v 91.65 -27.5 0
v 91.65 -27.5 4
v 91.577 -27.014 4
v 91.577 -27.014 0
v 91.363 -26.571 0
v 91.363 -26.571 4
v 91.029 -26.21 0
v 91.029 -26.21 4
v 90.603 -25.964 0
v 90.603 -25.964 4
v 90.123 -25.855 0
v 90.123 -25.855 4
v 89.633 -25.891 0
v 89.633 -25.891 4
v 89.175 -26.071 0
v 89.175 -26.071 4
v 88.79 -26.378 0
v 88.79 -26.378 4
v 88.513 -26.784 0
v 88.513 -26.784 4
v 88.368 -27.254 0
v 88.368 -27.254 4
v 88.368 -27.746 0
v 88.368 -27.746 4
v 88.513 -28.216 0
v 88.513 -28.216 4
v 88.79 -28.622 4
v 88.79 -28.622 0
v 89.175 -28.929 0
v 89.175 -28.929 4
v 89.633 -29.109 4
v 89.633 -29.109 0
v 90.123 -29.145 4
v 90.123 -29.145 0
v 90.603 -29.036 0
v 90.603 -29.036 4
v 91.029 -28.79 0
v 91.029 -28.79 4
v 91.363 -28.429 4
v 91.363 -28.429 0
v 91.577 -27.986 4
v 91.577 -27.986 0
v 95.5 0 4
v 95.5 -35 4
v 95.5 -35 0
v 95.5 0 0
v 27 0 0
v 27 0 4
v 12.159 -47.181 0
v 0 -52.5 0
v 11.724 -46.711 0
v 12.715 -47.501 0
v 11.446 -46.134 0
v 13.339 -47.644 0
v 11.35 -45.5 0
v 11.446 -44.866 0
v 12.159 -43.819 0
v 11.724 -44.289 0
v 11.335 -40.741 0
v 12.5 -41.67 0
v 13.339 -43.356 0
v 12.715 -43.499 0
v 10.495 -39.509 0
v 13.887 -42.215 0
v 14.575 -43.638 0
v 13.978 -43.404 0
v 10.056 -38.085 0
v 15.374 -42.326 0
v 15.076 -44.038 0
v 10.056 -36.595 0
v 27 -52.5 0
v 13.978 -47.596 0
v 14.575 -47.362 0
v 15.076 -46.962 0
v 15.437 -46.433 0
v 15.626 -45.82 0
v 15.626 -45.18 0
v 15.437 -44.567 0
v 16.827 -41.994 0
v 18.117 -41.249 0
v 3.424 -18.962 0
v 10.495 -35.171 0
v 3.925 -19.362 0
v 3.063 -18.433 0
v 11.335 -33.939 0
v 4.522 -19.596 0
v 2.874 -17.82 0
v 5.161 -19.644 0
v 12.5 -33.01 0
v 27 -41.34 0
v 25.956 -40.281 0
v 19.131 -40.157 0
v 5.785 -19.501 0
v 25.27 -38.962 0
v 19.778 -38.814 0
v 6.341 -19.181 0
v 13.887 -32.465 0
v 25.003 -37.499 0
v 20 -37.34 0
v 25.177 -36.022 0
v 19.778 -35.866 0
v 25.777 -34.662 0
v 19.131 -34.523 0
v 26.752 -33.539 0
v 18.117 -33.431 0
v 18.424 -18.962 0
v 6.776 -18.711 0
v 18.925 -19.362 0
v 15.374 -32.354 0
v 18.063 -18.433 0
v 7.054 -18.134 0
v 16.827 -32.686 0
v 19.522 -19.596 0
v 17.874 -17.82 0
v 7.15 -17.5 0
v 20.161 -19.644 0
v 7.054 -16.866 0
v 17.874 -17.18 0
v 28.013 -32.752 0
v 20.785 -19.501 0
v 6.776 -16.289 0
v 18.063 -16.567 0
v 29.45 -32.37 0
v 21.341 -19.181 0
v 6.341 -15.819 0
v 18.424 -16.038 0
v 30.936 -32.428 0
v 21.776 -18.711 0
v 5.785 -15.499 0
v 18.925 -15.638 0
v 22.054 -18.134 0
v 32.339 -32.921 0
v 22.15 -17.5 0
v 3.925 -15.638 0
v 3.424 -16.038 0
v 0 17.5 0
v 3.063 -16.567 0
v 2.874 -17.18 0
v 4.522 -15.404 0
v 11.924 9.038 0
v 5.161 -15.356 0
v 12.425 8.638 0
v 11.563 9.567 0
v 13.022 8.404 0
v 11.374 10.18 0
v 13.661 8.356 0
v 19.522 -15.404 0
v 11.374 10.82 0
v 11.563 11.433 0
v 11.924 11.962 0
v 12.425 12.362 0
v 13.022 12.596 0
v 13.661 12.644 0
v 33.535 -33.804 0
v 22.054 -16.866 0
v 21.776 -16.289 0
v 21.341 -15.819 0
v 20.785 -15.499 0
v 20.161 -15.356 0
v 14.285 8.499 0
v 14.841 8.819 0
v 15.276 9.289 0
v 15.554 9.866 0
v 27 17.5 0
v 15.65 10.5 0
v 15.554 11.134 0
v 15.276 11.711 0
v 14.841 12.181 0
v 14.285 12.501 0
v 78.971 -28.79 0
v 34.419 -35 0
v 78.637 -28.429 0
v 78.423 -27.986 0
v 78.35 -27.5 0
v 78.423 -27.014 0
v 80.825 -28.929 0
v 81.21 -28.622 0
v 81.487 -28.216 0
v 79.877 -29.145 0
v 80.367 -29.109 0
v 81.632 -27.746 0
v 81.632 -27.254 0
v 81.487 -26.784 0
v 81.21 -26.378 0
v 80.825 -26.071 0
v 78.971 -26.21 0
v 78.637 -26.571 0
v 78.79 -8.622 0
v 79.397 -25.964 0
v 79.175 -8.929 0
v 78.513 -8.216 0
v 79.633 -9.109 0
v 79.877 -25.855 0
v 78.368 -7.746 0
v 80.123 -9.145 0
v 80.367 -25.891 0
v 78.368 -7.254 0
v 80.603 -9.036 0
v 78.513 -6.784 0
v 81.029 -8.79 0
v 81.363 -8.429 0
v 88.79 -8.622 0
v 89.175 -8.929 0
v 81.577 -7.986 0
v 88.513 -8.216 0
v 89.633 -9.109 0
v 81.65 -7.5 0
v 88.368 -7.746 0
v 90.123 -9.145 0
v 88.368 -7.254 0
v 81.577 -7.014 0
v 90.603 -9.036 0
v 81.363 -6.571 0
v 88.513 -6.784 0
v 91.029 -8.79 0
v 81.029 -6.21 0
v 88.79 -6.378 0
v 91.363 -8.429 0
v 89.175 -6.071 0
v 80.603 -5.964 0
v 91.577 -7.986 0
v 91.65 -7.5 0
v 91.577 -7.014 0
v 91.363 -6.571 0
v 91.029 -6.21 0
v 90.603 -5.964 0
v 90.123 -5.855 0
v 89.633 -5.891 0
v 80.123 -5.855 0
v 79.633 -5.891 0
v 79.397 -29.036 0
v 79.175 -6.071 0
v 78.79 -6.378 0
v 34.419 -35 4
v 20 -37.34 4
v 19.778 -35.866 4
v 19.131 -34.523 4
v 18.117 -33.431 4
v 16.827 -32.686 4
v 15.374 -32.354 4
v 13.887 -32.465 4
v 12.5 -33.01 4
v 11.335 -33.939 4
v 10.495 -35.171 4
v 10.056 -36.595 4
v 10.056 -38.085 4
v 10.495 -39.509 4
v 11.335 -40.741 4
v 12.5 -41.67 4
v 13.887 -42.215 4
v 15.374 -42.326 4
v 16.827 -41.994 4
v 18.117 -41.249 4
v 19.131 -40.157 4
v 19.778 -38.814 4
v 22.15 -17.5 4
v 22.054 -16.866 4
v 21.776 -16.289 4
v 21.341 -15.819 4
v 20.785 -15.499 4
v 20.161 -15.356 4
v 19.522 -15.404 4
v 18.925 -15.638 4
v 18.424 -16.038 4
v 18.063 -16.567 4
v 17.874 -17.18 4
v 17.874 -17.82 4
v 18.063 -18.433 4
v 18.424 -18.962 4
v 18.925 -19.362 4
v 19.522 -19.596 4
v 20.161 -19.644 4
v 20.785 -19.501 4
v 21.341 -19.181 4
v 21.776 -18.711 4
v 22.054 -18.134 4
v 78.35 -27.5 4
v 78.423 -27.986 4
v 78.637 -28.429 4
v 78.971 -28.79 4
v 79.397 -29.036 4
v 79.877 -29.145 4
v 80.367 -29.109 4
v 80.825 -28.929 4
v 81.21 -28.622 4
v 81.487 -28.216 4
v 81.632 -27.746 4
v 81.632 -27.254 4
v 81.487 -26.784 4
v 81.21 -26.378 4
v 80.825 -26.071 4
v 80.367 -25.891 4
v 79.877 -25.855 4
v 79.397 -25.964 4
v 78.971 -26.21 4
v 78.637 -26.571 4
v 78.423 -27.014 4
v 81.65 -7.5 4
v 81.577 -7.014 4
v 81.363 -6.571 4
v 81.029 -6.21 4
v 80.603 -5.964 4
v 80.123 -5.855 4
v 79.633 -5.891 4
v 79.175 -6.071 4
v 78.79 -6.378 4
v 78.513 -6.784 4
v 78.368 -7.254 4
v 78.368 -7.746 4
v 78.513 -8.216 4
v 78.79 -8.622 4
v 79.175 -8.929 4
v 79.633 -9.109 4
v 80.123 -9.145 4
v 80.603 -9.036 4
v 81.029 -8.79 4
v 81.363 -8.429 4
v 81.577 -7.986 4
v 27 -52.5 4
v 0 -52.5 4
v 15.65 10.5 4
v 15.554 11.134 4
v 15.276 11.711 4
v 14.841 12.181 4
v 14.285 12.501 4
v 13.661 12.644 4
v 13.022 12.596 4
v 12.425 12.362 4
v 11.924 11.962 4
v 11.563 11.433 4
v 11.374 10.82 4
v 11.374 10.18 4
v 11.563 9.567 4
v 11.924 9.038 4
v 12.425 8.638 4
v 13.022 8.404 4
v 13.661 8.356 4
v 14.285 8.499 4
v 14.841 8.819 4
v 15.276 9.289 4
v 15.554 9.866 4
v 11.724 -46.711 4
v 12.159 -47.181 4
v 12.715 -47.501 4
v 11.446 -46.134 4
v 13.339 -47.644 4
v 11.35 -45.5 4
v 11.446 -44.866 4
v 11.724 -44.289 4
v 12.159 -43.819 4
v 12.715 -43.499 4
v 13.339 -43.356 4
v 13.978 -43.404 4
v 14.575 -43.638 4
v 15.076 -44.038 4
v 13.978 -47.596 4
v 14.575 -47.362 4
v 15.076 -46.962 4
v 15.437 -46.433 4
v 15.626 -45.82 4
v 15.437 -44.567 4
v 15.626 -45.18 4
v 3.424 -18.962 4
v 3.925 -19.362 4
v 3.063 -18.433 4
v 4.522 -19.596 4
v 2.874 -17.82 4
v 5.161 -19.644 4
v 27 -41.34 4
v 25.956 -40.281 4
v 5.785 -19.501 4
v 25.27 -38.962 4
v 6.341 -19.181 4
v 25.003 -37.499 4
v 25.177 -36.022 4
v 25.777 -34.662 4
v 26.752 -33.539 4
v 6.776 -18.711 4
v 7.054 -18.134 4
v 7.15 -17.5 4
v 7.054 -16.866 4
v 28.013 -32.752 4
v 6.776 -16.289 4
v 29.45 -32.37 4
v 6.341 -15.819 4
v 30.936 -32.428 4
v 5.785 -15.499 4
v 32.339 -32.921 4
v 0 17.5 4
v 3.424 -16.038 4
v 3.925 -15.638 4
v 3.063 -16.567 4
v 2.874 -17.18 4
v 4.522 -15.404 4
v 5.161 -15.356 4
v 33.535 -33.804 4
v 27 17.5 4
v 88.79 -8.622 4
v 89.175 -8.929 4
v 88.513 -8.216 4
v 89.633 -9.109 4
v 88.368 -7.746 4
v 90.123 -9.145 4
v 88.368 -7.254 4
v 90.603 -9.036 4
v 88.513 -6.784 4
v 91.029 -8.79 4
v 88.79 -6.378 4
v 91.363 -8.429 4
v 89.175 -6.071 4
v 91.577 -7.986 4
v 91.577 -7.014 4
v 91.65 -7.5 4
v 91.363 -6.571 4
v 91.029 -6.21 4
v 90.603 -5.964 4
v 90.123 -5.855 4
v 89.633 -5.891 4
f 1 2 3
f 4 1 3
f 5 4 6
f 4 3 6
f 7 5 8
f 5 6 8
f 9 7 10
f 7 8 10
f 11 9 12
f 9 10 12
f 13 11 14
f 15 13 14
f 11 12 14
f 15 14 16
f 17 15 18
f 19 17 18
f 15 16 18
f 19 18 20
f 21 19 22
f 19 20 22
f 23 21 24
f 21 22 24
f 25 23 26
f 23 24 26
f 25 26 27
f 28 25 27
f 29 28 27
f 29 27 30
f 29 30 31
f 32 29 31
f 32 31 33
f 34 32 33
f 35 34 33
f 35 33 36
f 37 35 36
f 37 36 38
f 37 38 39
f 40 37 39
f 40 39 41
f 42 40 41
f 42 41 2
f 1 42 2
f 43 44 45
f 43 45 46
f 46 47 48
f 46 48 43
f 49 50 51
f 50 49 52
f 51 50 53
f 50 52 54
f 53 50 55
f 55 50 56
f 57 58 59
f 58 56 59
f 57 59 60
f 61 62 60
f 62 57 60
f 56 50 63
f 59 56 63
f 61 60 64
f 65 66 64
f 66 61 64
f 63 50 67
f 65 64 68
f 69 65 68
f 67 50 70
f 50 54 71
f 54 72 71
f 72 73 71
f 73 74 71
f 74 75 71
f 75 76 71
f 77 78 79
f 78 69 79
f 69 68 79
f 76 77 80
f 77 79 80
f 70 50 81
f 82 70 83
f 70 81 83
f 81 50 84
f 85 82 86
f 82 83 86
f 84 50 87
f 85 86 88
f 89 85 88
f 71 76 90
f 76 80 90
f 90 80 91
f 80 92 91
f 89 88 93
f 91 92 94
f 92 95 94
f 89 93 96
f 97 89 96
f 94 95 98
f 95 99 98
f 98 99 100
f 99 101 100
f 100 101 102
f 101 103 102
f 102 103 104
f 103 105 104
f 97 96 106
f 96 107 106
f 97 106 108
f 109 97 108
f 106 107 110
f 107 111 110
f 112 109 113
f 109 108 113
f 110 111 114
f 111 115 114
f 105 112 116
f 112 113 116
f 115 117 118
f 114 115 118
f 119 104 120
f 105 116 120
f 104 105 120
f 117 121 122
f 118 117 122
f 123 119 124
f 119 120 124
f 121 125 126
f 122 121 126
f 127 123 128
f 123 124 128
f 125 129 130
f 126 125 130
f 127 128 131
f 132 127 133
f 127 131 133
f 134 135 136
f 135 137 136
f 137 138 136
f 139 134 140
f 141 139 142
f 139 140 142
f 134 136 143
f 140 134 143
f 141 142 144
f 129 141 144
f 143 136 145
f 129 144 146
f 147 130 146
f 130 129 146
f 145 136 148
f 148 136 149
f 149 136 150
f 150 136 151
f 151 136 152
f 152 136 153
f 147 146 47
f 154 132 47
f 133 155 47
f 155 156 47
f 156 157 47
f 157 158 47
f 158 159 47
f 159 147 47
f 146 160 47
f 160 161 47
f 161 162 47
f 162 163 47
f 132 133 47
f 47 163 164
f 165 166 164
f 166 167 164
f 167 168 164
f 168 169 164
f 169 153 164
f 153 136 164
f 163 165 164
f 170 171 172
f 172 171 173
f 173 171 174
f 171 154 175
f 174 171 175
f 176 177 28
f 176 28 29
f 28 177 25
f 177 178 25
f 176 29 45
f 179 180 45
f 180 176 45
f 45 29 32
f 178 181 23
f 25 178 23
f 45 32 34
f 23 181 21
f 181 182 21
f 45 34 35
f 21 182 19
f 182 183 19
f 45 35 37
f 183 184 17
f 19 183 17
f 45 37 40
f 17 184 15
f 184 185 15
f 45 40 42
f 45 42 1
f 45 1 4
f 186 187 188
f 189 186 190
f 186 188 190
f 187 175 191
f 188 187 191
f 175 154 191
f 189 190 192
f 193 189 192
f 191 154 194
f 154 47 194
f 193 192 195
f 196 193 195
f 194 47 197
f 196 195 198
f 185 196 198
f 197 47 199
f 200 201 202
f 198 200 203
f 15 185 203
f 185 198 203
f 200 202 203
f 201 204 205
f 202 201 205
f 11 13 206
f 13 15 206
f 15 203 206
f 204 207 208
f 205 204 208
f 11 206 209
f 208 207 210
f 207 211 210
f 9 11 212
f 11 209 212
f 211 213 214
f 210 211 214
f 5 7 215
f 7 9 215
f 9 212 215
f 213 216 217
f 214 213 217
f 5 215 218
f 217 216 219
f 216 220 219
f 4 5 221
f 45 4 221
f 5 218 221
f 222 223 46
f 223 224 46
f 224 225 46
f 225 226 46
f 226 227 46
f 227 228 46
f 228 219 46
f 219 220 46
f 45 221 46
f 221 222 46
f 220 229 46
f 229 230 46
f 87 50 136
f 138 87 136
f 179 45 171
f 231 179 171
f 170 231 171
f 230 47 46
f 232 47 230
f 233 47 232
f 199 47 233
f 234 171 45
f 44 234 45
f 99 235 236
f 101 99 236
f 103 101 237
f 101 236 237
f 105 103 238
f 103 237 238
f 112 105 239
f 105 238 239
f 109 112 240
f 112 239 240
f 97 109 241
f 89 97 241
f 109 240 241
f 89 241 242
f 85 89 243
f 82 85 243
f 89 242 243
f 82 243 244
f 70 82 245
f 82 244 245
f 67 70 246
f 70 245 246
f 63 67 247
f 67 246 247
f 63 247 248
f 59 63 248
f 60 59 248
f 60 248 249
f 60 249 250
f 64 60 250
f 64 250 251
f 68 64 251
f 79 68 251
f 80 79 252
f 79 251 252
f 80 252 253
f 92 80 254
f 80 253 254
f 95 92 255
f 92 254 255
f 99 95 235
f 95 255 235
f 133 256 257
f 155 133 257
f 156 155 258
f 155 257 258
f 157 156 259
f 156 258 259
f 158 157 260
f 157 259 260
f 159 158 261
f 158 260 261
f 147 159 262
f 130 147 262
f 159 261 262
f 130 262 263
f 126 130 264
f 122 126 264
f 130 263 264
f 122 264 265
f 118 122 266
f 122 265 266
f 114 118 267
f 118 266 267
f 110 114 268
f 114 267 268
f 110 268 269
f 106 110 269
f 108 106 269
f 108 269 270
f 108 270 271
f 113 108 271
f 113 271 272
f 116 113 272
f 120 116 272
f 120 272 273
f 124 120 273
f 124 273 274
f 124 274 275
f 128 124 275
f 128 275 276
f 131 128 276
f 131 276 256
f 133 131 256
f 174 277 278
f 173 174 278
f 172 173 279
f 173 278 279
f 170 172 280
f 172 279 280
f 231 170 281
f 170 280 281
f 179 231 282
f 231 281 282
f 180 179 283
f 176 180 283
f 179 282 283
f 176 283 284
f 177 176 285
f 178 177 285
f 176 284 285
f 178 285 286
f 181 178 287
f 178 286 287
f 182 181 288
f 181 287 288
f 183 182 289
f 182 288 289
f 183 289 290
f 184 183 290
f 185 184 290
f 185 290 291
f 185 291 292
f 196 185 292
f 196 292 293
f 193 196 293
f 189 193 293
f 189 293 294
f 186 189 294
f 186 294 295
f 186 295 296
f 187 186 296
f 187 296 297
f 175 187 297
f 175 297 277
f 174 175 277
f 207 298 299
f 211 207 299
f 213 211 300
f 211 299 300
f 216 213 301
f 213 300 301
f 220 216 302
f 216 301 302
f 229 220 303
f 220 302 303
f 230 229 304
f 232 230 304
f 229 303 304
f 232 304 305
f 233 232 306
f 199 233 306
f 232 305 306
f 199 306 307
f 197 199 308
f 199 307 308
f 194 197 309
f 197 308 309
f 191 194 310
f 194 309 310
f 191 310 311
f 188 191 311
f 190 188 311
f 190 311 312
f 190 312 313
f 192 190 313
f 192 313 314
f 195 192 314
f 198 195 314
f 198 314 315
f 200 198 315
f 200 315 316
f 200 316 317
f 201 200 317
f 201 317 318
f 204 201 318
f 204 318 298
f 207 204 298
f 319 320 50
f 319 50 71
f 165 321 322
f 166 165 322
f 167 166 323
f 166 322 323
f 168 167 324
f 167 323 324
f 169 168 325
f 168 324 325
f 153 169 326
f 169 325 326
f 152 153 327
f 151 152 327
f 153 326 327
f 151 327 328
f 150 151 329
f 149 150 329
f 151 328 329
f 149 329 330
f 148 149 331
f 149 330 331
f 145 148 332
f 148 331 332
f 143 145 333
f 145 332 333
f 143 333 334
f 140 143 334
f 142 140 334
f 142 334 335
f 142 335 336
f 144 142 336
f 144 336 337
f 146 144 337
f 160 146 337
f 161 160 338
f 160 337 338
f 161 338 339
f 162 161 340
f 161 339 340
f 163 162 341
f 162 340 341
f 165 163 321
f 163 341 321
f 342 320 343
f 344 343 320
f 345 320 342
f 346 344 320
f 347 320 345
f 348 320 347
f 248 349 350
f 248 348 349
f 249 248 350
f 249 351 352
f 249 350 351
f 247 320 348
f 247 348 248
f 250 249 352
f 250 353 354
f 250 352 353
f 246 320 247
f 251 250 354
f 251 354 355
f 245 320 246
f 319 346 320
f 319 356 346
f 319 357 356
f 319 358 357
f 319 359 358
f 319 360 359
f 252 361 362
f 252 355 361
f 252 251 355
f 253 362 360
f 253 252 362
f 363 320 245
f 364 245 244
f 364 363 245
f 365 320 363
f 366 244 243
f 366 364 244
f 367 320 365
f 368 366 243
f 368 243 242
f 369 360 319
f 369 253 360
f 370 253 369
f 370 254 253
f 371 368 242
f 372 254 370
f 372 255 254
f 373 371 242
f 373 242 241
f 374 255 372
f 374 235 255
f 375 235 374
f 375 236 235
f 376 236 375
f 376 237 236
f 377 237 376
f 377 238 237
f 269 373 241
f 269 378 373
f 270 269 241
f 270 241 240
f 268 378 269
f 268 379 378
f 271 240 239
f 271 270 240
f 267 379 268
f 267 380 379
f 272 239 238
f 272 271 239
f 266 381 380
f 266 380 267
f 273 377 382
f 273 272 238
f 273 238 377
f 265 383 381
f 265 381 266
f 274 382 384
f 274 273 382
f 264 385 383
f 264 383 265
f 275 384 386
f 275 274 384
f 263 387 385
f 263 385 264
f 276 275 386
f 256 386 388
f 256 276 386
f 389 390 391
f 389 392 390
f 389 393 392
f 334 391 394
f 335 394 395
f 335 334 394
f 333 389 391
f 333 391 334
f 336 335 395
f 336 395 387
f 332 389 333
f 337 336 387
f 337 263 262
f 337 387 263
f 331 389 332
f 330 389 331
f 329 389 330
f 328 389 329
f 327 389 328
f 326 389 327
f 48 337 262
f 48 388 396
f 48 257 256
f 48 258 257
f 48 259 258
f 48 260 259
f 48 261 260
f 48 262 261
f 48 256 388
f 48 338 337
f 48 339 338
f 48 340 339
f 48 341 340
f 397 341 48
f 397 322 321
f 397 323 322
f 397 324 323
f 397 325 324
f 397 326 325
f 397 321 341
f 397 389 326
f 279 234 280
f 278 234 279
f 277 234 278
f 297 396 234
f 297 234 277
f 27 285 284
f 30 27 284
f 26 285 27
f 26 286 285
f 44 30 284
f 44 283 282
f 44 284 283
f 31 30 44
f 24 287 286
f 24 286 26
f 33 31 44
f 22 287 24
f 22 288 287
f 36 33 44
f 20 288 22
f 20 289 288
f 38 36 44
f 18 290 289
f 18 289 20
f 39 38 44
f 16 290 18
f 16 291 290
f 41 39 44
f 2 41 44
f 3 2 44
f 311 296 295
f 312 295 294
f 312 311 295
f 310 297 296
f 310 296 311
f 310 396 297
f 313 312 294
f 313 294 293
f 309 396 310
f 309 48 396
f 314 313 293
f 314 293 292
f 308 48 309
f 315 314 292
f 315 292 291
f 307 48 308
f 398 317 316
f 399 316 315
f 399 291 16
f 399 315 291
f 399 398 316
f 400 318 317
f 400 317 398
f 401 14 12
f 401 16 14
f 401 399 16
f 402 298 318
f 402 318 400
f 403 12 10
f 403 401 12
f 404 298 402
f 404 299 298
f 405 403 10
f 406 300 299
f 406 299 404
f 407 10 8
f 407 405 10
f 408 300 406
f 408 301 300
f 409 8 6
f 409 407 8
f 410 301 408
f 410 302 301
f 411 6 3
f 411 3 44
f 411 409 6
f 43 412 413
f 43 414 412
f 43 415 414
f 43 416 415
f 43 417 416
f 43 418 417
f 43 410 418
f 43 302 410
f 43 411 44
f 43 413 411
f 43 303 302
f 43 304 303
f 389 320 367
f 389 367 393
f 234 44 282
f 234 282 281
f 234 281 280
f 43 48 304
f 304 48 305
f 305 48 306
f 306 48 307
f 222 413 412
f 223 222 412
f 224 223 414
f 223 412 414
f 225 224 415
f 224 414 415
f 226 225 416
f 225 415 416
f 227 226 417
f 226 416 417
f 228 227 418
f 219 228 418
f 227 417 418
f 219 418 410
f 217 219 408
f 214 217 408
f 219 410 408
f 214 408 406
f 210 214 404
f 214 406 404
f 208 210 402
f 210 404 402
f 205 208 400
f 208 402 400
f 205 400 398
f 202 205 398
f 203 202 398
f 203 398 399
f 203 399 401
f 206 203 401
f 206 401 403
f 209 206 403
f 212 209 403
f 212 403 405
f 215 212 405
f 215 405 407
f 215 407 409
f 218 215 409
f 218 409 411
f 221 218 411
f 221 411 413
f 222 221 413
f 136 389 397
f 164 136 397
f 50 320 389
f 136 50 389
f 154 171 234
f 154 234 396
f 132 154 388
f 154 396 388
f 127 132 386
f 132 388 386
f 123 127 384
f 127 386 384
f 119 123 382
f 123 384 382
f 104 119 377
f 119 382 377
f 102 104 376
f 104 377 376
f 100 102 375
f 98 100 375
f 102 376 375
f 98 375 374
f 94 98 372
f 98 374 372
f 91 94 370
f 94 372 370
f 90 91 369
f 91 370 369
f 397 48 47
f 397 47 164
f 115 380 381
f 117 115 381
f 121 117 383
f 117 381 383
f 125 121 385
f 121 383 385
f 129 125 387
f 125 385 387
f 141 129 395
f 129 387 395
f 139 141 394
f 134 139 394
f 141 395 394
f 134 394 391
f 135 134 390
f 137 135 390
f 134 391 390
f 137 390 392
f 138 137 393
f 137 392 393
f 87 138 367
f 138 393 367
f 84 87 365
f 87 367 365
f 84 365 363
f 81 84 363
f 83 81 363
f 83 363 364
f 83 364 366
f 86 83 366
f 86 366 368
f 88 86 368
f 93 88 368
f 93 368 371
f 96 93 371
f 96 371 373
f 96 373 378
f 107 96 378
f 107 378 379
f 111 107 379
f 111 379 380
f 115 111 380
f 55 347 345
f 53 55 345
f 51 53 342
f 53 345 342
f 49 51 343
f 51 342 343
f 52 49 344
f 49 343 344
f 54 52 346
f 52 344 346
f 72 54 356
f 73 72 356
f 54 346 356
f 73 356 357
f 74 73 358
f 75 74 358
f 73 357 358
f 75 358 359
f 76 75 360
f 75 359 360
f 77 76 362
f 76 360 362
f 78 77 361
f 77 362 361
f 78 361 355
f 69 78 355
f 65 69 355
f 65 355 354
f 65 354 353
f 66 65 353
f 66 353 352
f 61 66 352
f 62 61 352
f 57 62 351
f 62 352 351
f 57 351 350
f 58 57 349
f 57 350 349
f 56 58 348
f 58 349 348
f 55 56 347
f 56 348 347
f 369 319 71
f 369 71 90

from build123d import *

# Parameters (mm, degrees)
SKETCH_1_W          = 100
SKETCH_1_H          = 35
EXTRUDE_1_DEPTH     = 4
SKETCH_2_R          = 1.65
CUT_EXTRUDE_1_DEPTH = 107.023582282
SKETCH_4_R          = 2.15
CUT_EXTRUDE_3_DEPTH = 107.023582282
SKETCH_8_W          = 27
SKETCH_8_H          = 70
SKETCH_8_R          = 2.15
EXTRUDE_2_DEPTH     = 4
SKETCH_9_R          = 5
CUT_EXTRUDE_6_DEPTH = 4
SKETCH_10_R         = 1.65
CUT_EXTRUDE_7_DEPTH = 10
SKETCH_11_W         = 4.5
SKETCH_11_H         = 35
CUT_EXTRUDE_8_DEPTH = 10


with BuildPart() as part:
    # 草图1 → 凸台-拉伸1 (new body)
    with BuildSketch(Plane.XY):
        with Locations((50, -17.5)):
            Rectangle(SKETCH_1_W, SKETCH_1_H)
    extrude(amount=EXTRUDE_1_DEPTH)

    # 草图2 → 切除-拉伸1 (cut, through all)
    with BuildSketch(Plane.XY.offset(4)):
        with Locations((80, -7.5)):
            Circle(SKETCH_2_R)
        with Locations(Location((80, -27.5, 0), (0, 0, 180))):
            Circle(SKETCH_2_R)
    extrude(amount=-CUT_EXTRUDE_1_DEPTH, mode=Mode.SUBTRACT)

    # 草图4 → 切除-拉伸3 (cut, through all)
    with BuildSketch(Plane.XY.offset(4)):
        with Locations((5, -17.5)):
            Circle(SKETCH_4_R)
        with Locations((20, -17.5)):
            Circle(SKETCH_4_R)
    extrude(amount=-CUT_EXTRUDE_3_DEPTH, mode=Mode.SUBTRACT)

    # 草图8 → 凸台-拉伸2 (add)
    with BuildSketch(Plane.XY.offset(4)):
        with Locations((13.5, -17.5)):
            Rectangle(SKETCH_8_W, SKETCH_8_H)
        with Locations((13.5, 10.5)):
            Circle(SKETCH_8_R, mode=Mode.SUBTRACT)
        with Locations(Location((13.5, -45.5, 0), (0, 0, 180))):
            Circle(SKETCH_8_R, mode=Mode.SUBTRACT)
        with Locations((5, -17.5)):
            Circle(SKETCH_8_R, mode=Mode.SUBTRACT)
        with Locations((20, -17.5)):
            Circle(SKETCH_8_R, mode=Mode.SUBTRACT)
    extrude(amount=-EXTRUDE_2_DEPTH)

    # 草图9 → 切除-拉伸6 (cut)
    with BuildSketch(Plane.XY.offset(4)):
        with Locations((30, -37.34)):
            Circle(SKETCH_9_R)
        with Locations((15, -37.34)):
            Circle(SKETCH_9_R)
    extrude(amount=-CUT_EXTRUDE_6_DEPTH, mode=Mode.SUBTRACT)

    # 草图10 → 切除-拉伸7 (cut)
    with BuildSketch(Plane.XY.offset(4)):
        with Locations((90, -7.5)):
            Circle(SKETCH_10_R)
        with Locations((90, -27.5)):
            Circle(SKETCH_10_R)
    extrude(amount=-CUT_EXTRUDE_7_DEPTH, mode=Mode.SUBTRACT)

    # 草图11 → 切除-拉伸8 (cut)
    with BuildSketch(Plane.XY.offset(4)):
        with Locations((97.75, -17.5)):
            Rectangle(SKETCH_11_W, SKETCH_11_H)
    extrude(amount=-CUT_EXTRUDE_8_DEPTH, mode=Mode.SUBTRACT)


solid = part.part
